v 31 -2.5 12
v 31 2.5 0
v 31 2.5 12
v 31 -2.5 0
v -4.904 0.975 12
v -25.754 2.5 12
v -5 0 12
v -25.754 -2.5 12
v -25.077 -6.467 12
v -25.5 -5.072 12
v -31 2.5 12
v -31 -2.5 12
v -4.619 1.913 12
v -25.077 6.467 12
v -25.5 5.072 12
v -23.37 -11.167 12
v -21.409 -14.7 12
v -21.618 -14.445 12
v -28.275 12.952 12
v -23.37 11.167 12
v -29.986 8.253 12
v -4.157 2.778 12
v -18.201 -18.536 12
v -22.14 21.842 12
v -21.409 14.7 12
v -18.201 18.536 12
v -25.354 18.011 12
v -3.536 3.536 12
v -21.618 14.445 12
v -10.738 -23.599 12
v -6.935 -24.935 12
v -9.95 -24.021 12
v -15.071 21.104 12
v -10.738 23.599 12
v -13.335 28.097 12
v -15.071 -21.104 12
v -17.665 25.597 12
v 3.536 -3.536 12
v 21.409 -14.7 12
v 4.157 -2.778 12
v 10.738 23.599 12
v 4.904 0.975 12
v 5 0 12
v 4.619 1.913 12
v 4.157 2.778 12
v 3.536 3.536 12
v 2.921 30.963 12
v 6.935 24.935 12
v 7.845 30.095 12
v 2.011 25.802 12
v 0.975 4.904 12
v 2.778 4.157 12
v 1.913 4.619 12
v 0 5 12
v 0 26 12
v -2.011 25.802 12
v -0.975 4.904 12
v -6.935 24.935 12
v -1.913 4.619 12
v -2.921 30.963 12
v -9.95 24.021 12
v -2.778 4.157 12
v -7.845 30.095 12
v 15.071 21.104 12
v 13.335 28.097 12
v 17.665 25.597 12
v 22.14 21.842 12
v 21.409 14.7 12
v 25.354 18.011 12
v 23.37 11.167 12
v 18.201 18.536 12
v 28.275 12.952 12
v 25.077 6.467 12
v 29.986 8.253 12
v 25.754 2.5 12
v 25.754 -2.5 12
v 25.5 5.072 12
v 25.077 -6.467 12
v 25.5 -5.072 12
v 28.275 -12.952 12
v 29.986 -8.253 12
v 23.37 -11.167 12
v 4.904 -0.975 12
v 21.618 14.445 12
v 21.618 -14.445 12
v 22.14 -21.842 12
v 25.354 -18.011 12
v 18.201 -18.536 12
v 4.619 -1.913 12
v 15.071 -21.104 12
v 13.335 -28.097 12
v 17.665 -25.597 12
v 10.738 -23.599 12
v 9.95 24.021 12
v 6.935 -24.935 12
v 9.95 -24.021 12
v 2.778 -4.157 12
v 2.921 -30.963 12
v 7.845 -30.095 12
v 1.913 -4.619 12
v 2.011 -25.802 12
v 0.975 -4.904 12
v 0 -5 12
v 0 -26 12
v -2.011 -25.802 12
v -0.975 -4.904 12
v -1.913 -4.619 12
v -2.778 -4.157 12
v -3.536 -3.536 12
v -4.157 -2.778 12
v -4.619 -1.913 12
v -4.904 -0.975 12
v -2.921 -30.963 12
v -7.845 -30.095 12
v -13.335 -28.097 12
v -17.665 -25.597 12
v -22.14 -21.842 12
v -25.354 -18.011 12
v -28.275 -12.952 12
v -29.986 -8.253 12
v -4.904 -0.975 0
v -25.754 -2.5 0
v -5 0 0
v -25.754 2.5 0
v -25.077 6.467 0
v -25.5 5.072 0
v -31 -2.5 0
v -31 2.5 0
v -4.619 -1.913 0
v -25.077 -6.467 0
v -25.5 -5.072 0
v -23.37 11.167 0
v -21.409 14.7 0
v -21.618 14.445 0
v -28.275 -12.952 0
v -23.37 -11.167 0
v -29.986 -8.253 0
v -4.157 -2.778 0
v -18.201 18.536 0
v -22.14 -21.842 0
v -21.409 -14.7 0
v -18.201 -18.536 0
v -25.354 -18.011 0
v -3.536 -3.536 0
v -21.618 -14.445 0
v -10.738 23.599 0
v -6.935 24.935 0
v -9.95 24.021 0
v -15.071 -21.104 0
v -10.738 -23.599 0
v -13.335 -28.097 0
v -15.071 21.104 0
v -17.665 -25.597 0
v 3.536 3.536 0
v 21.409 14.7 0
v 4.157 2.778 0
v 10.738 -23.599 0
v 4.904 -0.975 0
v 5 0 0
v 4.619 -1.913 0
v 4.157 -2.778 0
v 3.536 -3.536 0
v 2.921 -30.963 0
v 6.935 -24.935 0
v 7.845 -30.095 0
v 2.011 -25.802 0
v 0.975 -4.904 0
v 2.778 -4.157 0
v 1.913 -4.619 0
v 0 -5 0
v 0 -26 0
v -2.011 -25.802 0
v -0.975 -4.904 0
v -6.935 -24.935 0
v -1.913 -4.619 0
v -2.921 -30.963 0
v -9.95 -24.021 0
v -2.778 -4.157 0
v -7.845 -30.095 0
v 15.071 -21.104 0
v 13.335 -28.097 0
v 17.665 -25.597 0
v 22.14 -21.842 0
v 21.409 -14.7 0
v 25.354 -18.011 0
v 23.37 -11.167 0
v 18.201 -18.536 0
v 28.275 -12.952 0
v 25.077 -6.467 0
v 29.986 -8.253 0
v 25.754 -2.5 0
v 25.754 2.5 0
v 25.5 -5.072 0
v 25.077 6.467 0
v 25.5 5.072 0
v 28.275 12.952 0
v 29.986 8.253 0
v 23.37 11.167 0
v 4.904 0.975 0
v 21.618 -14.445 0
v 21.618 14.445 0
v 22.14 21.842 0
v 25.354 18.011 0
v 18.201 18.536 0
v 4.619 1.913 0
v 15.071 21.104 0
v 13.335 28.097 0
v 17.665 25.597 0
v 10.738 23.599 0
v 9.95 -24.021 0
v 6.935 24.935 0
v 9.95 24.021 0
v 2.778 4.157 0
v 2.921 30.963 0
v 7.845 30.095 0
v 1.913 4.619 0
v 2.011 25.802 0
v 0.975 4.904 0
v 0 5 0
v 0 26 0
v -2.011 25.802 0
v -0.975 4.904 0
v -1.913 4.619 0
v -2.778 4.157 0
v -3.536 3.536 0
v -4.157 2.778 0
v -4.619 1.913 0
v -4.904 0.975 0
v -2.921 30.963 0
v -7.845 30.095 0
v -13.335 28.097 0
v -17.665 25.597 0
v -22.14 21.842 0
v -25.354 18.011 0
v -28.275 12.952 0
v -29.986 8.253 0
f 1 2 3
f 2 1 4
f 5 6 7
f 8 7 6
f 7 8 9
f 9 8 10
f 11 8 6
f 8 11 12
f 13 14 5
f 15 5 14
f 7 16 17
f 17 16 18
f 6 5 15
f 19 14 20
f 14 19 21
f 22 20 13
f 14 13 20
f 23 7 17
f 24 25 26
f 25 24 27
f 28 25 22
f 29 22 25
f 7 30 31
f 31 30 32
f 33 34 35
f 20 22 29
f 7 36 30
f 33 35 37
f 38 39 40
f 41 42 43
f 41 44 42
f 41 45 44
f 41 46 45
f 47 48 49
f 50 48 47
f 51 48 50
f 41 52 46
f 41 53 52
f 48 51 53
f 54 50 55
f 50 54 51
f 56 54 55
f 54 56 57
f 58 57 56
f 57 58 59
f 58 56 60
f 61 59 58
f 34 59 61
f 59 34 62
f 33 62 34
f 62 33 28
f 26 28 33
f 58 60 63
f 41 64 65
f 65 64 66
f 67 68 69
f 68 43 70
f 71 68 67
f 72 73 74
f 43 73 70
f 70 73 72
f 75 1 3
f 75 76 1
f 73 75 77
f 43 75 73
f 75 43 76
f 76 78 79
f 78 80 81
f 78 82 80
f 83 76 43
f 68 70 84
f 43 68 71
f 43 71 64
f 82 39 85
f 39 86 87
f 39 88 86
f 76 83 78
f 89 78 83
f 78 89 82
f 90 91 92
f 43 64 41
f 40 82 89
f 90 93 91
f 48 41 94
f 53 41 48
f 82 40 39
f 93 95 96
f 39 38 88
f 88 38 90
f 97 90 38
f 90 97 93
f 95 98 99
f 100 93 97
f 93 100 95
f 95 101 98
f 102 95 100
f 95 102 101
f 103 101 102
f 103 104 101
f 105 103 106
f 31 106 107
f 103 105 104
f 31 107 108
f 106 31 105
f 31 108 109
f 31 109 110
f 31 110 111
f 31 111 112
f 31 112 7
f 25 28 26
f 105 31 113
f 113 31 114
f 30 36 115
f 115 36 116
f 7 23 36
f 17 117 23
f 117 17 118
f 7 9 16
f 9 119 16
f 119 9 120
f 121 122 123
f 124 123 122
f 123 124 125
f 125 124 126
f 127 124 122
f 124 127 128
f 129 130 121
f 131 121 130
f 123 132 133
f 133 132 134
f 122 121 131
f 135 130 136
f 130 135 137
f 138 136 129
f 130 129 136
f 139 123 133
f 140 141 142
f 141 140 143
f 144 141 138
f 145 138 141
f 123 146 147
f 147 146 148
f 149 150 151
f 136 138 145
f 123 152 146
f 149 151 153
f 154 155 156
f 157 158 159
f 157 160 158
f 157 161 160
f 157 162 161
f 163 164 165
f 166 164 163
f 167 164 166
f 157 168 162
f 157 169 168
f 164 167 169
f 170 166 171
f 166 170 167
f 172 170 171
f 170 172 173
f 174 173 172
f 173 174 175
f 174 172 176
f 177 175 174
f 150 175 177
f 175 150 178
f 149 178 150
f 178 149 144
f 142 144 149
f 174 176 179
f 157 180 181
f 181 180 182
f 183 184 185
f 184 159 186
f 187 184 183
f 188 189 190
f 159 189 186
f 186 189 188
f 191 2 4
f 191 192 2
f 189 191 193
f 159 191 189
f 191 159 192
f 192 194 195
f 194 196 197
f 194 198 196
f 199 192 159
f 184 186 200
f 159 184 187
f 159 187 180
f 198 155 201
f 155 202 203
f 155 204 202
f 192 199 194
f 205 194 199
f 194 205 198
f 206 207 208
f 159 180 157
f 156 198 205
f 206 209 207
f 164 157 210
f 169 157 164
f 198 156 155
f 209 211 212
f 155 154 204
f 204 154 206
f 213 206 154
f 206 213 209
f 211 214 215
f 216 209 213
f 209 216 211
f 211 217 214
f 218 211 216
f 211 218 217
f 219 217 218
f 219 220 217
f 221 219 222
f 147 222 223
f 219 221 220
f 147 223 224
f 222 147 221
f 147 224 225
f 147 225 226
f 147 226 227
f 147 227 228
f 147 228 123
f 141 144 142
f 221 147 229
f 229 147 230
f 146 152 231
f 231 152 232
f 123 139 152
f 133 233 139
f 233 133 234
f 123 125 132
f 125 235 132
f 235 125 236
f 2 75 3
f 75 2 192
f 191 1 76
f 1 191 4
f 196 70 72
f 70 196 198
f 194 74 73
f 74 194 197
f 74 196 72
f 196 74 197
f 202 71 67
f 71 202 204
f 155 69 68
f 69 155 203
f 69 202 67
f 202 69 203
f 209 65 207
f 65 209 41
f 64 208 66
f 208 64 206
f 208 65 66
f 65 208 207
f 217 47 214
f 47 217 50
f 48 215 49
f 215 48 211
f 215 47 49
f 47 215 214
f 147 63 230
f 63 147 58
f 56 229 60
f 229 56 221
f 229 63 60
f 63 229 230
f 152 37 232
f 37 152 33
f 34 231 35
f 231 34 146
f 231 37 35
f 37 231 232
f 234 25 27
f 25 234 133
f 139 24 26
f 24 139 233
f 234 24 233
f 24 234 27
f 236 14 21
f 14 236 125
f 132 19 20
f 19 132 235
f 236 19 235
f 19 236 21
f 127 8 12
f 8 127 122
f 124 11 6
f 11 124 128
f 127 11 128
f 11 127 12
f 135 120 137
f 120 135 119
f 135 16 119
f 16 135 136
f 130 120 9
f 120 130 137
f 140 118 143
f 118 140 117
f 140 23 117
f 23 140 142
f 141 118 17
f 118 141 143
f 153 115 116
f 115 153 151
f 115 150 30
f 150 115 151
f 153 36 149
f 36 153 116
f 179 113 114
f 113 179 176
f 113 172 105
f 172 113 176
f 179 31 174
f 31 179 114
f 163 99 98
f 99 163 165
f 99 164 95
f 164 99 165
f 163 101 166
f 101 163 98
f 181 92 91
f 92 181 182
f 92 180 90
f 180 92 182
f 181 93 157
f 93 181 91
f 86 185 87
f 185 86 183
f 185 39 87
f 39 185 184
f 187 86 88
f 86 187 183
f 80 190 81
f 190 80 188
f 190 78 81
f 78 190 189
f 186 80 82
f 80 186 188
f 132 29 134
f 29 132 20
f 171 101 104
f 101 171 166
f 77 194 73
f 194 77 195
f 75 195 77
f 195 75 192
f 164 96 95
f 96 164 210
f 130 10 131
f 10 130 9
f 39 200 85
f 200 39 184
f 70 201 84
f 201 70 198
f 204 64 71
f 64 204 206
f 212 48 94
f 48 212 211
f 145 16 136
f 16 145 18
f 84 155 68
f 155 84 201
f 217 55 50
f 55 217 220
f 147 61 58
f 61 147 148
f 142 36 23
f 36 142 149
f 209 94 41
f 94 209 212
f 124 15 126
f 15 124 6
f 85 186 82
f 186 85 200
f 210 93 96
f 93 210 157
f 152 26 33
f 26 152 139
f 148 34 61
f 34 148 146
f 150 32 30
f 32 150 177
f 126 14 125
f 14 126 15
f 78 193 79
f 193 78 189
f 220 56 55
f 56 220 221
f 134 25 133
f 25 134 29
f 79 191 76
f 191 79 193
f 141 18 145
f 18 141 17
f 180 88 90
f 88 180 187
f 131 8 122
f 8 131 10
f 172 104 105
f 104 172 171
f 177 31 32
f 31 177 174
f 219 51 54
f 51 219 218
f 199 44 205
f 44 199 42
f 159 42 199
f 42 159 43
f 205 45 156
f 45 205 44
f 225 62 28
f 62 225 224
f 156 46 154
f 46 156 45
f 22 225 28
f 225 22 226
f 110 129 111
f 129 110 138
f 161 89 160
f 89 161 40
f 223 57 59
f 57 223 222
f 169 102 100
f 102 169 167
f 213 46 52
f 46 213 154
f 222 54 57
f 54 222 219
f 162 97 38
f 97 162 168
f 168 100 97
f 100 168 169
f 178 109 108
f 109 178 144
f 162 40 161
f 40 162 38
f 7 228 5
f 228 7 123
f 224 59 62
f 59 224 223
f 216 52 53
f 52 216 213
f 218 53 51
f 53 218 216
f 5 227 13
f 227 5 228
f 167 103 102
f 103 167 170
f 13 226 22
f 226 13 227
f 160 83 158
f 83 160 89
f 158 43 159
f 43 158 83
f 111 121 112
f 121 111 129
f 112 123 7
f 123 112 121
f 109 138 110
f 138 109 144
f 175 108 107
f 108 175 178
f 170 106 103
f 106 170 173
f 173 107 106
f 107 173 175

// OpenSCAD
$fn = 32;

// ----------------------------------------------------------------------
// Spur blank: bored gear blank
// ----------------------------------------------------------------------

// --- parameters (mm) ---
disc_r = 26;              // blank root radius
disc_t = 12;              // blank thickness
n_teeth = 18;             // stub tooth count
tooth_w = 5;              // tooth width at the root
tooth_h = 5;              // tooth height above the root
bore_r = 5;               // central bore radius
fit_tol = 0.1;            // tolerance for press fits, mm
free_tol = 0.5;           // tolerance for clearance fits, mm

out_r = disc_r + tooth_h;  // tip radius
bbox_x = 62.0;  // measured width over the teeth
bbox_y = 61.93;  // measured depth over the teeth

difference() {
union() {
  cylinder(r = disc_r, h = disc_t);
  for (i = [0 : n_teeth - 1])
    rotate([0, 0, i * 360 / n_teeth])
      translate([disc_r - 1, -tooth_w / 2, 0])
        cube([tooth_h + 1, tooth_w, disc_t]);
}
  translate([0, 0, -1]) cylinder(r = bore_r, h = disc_t + 2);
}
